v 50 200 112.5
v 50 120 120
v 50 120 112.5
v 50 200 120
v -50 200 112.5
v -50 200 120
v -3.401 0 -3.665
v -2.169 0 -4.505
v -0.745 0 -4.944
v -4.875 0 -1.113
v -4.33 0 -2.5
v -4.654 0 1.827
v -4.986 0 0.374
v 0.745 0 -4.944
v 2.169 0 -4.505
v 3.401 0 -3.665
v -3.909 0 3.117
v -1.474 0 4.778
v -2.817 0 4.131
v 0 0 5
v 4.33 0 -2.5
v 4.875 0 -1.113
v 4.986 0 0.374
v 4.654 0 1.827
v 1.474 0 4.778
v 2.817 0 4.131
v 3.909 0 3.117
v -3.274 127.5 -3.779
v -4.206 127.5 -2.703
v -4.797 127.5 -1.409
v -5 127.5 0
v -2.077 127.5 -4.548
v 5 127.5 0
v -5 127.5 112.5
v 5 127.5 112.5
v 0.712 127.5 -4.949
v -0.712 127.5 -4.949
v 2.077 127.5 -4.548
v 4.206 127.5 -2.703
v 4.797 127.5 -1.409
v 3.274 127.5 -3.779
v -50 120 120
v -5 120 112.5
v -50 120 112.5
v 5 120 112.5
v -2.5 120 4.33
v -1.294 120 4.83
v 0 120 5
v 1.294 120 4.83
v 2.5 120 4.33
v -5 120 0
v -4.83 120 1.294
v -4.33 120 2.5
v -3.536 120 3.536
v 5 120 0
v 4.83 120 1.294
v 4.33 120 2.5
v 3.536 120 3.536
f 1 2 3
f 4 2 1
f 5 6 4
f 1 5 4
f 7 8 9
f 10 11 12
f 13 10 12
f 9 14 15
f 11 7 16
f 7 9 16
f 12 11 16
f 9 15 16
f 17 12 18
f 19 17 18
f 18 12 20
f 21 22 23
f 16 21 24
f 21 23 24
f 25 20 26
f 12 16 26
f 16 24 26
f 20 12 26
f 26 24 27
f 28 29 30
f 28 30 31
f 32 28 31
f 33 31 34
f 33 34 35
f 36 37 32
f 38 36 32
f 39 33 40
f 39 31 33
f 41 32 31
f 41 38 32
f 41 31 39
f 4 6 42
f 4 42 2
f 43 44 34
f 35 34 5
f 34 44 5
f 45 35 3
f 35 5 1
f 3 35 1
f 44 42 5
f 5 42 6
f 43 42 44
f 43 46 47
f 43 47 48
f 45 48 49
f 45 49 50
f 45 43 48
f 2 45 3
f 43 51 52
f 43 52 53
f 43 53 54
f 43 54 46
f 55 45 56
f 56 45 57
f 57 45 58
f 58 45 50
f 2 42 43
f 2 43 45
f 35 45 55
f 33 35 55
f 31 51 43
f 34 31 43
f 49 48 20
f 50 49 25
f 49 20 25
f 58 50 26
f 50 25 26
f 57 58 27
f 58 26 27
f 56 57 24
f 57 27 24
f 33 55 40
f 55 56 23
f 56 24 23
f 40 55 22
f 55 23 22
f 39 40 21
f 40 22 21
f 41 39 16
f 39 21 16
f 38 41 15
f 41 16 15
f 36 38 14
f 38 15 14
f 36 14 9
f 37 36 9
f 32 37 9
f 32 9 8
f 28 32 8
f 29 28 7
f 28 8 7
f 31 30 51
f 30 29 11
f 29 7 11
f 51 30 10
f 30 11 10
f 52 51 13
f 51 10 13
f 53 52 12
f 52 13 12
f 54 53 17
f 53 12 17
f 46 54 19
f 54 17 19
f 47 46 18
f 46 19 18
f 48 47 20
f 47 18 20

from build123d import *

# Parameters (mm, degrees)
SKETCH1_R           = 5
BRANCH_DEPTH        = 120
BOSS_EXTRUDE1_DEPTH = 7.5
SKETCH3_W           = 100
SKETCH3_H           = 80
BOSS_EXTRUDE2_DEPTH = 7.5


with BuildPart() as part:
    # Sketch1 → branch (new body)
    with BuildSketch(Plane(origin=(0, 0, 0), x_dir=(1, 0, 0), z_dir=(0, 1, 0))):
        with Locations(Location((0, 0, 0), (0, 0, 270))):
            Circle(SKETCH1_R)
    extrude(amount=BRANCH_DEPTH)

    # Sketch2 → Boss-Extrude1 (add)
    with BuildSketch(Plane(origin=(0, 120, 0), x_dir=(1, 0, 0), z_dir=(0, 1, 0))):
        with BuildLine():
            Line((-5, 0), (-5, -120))
            Line((-5, -120), (5, -120))
            Line((5, -120), (5, 0))
            ThreePointArc((5, 0), (0, 5), (-5, 0))
        make_face()
    extrude(amount=BOSS_EXTRUDE1_DEPTH)

    # Sketch3 → Boss-Extrude2 (add)
    with BuildSketch(Plane.XY.offset(120)):
        with Locations((0, 160)):
            Rectangle(SKETCH3_W, SKETCH3_H)
    extrude(amount=-BOSS_EXTRUDE2_DEPTH)


solid = part.part
